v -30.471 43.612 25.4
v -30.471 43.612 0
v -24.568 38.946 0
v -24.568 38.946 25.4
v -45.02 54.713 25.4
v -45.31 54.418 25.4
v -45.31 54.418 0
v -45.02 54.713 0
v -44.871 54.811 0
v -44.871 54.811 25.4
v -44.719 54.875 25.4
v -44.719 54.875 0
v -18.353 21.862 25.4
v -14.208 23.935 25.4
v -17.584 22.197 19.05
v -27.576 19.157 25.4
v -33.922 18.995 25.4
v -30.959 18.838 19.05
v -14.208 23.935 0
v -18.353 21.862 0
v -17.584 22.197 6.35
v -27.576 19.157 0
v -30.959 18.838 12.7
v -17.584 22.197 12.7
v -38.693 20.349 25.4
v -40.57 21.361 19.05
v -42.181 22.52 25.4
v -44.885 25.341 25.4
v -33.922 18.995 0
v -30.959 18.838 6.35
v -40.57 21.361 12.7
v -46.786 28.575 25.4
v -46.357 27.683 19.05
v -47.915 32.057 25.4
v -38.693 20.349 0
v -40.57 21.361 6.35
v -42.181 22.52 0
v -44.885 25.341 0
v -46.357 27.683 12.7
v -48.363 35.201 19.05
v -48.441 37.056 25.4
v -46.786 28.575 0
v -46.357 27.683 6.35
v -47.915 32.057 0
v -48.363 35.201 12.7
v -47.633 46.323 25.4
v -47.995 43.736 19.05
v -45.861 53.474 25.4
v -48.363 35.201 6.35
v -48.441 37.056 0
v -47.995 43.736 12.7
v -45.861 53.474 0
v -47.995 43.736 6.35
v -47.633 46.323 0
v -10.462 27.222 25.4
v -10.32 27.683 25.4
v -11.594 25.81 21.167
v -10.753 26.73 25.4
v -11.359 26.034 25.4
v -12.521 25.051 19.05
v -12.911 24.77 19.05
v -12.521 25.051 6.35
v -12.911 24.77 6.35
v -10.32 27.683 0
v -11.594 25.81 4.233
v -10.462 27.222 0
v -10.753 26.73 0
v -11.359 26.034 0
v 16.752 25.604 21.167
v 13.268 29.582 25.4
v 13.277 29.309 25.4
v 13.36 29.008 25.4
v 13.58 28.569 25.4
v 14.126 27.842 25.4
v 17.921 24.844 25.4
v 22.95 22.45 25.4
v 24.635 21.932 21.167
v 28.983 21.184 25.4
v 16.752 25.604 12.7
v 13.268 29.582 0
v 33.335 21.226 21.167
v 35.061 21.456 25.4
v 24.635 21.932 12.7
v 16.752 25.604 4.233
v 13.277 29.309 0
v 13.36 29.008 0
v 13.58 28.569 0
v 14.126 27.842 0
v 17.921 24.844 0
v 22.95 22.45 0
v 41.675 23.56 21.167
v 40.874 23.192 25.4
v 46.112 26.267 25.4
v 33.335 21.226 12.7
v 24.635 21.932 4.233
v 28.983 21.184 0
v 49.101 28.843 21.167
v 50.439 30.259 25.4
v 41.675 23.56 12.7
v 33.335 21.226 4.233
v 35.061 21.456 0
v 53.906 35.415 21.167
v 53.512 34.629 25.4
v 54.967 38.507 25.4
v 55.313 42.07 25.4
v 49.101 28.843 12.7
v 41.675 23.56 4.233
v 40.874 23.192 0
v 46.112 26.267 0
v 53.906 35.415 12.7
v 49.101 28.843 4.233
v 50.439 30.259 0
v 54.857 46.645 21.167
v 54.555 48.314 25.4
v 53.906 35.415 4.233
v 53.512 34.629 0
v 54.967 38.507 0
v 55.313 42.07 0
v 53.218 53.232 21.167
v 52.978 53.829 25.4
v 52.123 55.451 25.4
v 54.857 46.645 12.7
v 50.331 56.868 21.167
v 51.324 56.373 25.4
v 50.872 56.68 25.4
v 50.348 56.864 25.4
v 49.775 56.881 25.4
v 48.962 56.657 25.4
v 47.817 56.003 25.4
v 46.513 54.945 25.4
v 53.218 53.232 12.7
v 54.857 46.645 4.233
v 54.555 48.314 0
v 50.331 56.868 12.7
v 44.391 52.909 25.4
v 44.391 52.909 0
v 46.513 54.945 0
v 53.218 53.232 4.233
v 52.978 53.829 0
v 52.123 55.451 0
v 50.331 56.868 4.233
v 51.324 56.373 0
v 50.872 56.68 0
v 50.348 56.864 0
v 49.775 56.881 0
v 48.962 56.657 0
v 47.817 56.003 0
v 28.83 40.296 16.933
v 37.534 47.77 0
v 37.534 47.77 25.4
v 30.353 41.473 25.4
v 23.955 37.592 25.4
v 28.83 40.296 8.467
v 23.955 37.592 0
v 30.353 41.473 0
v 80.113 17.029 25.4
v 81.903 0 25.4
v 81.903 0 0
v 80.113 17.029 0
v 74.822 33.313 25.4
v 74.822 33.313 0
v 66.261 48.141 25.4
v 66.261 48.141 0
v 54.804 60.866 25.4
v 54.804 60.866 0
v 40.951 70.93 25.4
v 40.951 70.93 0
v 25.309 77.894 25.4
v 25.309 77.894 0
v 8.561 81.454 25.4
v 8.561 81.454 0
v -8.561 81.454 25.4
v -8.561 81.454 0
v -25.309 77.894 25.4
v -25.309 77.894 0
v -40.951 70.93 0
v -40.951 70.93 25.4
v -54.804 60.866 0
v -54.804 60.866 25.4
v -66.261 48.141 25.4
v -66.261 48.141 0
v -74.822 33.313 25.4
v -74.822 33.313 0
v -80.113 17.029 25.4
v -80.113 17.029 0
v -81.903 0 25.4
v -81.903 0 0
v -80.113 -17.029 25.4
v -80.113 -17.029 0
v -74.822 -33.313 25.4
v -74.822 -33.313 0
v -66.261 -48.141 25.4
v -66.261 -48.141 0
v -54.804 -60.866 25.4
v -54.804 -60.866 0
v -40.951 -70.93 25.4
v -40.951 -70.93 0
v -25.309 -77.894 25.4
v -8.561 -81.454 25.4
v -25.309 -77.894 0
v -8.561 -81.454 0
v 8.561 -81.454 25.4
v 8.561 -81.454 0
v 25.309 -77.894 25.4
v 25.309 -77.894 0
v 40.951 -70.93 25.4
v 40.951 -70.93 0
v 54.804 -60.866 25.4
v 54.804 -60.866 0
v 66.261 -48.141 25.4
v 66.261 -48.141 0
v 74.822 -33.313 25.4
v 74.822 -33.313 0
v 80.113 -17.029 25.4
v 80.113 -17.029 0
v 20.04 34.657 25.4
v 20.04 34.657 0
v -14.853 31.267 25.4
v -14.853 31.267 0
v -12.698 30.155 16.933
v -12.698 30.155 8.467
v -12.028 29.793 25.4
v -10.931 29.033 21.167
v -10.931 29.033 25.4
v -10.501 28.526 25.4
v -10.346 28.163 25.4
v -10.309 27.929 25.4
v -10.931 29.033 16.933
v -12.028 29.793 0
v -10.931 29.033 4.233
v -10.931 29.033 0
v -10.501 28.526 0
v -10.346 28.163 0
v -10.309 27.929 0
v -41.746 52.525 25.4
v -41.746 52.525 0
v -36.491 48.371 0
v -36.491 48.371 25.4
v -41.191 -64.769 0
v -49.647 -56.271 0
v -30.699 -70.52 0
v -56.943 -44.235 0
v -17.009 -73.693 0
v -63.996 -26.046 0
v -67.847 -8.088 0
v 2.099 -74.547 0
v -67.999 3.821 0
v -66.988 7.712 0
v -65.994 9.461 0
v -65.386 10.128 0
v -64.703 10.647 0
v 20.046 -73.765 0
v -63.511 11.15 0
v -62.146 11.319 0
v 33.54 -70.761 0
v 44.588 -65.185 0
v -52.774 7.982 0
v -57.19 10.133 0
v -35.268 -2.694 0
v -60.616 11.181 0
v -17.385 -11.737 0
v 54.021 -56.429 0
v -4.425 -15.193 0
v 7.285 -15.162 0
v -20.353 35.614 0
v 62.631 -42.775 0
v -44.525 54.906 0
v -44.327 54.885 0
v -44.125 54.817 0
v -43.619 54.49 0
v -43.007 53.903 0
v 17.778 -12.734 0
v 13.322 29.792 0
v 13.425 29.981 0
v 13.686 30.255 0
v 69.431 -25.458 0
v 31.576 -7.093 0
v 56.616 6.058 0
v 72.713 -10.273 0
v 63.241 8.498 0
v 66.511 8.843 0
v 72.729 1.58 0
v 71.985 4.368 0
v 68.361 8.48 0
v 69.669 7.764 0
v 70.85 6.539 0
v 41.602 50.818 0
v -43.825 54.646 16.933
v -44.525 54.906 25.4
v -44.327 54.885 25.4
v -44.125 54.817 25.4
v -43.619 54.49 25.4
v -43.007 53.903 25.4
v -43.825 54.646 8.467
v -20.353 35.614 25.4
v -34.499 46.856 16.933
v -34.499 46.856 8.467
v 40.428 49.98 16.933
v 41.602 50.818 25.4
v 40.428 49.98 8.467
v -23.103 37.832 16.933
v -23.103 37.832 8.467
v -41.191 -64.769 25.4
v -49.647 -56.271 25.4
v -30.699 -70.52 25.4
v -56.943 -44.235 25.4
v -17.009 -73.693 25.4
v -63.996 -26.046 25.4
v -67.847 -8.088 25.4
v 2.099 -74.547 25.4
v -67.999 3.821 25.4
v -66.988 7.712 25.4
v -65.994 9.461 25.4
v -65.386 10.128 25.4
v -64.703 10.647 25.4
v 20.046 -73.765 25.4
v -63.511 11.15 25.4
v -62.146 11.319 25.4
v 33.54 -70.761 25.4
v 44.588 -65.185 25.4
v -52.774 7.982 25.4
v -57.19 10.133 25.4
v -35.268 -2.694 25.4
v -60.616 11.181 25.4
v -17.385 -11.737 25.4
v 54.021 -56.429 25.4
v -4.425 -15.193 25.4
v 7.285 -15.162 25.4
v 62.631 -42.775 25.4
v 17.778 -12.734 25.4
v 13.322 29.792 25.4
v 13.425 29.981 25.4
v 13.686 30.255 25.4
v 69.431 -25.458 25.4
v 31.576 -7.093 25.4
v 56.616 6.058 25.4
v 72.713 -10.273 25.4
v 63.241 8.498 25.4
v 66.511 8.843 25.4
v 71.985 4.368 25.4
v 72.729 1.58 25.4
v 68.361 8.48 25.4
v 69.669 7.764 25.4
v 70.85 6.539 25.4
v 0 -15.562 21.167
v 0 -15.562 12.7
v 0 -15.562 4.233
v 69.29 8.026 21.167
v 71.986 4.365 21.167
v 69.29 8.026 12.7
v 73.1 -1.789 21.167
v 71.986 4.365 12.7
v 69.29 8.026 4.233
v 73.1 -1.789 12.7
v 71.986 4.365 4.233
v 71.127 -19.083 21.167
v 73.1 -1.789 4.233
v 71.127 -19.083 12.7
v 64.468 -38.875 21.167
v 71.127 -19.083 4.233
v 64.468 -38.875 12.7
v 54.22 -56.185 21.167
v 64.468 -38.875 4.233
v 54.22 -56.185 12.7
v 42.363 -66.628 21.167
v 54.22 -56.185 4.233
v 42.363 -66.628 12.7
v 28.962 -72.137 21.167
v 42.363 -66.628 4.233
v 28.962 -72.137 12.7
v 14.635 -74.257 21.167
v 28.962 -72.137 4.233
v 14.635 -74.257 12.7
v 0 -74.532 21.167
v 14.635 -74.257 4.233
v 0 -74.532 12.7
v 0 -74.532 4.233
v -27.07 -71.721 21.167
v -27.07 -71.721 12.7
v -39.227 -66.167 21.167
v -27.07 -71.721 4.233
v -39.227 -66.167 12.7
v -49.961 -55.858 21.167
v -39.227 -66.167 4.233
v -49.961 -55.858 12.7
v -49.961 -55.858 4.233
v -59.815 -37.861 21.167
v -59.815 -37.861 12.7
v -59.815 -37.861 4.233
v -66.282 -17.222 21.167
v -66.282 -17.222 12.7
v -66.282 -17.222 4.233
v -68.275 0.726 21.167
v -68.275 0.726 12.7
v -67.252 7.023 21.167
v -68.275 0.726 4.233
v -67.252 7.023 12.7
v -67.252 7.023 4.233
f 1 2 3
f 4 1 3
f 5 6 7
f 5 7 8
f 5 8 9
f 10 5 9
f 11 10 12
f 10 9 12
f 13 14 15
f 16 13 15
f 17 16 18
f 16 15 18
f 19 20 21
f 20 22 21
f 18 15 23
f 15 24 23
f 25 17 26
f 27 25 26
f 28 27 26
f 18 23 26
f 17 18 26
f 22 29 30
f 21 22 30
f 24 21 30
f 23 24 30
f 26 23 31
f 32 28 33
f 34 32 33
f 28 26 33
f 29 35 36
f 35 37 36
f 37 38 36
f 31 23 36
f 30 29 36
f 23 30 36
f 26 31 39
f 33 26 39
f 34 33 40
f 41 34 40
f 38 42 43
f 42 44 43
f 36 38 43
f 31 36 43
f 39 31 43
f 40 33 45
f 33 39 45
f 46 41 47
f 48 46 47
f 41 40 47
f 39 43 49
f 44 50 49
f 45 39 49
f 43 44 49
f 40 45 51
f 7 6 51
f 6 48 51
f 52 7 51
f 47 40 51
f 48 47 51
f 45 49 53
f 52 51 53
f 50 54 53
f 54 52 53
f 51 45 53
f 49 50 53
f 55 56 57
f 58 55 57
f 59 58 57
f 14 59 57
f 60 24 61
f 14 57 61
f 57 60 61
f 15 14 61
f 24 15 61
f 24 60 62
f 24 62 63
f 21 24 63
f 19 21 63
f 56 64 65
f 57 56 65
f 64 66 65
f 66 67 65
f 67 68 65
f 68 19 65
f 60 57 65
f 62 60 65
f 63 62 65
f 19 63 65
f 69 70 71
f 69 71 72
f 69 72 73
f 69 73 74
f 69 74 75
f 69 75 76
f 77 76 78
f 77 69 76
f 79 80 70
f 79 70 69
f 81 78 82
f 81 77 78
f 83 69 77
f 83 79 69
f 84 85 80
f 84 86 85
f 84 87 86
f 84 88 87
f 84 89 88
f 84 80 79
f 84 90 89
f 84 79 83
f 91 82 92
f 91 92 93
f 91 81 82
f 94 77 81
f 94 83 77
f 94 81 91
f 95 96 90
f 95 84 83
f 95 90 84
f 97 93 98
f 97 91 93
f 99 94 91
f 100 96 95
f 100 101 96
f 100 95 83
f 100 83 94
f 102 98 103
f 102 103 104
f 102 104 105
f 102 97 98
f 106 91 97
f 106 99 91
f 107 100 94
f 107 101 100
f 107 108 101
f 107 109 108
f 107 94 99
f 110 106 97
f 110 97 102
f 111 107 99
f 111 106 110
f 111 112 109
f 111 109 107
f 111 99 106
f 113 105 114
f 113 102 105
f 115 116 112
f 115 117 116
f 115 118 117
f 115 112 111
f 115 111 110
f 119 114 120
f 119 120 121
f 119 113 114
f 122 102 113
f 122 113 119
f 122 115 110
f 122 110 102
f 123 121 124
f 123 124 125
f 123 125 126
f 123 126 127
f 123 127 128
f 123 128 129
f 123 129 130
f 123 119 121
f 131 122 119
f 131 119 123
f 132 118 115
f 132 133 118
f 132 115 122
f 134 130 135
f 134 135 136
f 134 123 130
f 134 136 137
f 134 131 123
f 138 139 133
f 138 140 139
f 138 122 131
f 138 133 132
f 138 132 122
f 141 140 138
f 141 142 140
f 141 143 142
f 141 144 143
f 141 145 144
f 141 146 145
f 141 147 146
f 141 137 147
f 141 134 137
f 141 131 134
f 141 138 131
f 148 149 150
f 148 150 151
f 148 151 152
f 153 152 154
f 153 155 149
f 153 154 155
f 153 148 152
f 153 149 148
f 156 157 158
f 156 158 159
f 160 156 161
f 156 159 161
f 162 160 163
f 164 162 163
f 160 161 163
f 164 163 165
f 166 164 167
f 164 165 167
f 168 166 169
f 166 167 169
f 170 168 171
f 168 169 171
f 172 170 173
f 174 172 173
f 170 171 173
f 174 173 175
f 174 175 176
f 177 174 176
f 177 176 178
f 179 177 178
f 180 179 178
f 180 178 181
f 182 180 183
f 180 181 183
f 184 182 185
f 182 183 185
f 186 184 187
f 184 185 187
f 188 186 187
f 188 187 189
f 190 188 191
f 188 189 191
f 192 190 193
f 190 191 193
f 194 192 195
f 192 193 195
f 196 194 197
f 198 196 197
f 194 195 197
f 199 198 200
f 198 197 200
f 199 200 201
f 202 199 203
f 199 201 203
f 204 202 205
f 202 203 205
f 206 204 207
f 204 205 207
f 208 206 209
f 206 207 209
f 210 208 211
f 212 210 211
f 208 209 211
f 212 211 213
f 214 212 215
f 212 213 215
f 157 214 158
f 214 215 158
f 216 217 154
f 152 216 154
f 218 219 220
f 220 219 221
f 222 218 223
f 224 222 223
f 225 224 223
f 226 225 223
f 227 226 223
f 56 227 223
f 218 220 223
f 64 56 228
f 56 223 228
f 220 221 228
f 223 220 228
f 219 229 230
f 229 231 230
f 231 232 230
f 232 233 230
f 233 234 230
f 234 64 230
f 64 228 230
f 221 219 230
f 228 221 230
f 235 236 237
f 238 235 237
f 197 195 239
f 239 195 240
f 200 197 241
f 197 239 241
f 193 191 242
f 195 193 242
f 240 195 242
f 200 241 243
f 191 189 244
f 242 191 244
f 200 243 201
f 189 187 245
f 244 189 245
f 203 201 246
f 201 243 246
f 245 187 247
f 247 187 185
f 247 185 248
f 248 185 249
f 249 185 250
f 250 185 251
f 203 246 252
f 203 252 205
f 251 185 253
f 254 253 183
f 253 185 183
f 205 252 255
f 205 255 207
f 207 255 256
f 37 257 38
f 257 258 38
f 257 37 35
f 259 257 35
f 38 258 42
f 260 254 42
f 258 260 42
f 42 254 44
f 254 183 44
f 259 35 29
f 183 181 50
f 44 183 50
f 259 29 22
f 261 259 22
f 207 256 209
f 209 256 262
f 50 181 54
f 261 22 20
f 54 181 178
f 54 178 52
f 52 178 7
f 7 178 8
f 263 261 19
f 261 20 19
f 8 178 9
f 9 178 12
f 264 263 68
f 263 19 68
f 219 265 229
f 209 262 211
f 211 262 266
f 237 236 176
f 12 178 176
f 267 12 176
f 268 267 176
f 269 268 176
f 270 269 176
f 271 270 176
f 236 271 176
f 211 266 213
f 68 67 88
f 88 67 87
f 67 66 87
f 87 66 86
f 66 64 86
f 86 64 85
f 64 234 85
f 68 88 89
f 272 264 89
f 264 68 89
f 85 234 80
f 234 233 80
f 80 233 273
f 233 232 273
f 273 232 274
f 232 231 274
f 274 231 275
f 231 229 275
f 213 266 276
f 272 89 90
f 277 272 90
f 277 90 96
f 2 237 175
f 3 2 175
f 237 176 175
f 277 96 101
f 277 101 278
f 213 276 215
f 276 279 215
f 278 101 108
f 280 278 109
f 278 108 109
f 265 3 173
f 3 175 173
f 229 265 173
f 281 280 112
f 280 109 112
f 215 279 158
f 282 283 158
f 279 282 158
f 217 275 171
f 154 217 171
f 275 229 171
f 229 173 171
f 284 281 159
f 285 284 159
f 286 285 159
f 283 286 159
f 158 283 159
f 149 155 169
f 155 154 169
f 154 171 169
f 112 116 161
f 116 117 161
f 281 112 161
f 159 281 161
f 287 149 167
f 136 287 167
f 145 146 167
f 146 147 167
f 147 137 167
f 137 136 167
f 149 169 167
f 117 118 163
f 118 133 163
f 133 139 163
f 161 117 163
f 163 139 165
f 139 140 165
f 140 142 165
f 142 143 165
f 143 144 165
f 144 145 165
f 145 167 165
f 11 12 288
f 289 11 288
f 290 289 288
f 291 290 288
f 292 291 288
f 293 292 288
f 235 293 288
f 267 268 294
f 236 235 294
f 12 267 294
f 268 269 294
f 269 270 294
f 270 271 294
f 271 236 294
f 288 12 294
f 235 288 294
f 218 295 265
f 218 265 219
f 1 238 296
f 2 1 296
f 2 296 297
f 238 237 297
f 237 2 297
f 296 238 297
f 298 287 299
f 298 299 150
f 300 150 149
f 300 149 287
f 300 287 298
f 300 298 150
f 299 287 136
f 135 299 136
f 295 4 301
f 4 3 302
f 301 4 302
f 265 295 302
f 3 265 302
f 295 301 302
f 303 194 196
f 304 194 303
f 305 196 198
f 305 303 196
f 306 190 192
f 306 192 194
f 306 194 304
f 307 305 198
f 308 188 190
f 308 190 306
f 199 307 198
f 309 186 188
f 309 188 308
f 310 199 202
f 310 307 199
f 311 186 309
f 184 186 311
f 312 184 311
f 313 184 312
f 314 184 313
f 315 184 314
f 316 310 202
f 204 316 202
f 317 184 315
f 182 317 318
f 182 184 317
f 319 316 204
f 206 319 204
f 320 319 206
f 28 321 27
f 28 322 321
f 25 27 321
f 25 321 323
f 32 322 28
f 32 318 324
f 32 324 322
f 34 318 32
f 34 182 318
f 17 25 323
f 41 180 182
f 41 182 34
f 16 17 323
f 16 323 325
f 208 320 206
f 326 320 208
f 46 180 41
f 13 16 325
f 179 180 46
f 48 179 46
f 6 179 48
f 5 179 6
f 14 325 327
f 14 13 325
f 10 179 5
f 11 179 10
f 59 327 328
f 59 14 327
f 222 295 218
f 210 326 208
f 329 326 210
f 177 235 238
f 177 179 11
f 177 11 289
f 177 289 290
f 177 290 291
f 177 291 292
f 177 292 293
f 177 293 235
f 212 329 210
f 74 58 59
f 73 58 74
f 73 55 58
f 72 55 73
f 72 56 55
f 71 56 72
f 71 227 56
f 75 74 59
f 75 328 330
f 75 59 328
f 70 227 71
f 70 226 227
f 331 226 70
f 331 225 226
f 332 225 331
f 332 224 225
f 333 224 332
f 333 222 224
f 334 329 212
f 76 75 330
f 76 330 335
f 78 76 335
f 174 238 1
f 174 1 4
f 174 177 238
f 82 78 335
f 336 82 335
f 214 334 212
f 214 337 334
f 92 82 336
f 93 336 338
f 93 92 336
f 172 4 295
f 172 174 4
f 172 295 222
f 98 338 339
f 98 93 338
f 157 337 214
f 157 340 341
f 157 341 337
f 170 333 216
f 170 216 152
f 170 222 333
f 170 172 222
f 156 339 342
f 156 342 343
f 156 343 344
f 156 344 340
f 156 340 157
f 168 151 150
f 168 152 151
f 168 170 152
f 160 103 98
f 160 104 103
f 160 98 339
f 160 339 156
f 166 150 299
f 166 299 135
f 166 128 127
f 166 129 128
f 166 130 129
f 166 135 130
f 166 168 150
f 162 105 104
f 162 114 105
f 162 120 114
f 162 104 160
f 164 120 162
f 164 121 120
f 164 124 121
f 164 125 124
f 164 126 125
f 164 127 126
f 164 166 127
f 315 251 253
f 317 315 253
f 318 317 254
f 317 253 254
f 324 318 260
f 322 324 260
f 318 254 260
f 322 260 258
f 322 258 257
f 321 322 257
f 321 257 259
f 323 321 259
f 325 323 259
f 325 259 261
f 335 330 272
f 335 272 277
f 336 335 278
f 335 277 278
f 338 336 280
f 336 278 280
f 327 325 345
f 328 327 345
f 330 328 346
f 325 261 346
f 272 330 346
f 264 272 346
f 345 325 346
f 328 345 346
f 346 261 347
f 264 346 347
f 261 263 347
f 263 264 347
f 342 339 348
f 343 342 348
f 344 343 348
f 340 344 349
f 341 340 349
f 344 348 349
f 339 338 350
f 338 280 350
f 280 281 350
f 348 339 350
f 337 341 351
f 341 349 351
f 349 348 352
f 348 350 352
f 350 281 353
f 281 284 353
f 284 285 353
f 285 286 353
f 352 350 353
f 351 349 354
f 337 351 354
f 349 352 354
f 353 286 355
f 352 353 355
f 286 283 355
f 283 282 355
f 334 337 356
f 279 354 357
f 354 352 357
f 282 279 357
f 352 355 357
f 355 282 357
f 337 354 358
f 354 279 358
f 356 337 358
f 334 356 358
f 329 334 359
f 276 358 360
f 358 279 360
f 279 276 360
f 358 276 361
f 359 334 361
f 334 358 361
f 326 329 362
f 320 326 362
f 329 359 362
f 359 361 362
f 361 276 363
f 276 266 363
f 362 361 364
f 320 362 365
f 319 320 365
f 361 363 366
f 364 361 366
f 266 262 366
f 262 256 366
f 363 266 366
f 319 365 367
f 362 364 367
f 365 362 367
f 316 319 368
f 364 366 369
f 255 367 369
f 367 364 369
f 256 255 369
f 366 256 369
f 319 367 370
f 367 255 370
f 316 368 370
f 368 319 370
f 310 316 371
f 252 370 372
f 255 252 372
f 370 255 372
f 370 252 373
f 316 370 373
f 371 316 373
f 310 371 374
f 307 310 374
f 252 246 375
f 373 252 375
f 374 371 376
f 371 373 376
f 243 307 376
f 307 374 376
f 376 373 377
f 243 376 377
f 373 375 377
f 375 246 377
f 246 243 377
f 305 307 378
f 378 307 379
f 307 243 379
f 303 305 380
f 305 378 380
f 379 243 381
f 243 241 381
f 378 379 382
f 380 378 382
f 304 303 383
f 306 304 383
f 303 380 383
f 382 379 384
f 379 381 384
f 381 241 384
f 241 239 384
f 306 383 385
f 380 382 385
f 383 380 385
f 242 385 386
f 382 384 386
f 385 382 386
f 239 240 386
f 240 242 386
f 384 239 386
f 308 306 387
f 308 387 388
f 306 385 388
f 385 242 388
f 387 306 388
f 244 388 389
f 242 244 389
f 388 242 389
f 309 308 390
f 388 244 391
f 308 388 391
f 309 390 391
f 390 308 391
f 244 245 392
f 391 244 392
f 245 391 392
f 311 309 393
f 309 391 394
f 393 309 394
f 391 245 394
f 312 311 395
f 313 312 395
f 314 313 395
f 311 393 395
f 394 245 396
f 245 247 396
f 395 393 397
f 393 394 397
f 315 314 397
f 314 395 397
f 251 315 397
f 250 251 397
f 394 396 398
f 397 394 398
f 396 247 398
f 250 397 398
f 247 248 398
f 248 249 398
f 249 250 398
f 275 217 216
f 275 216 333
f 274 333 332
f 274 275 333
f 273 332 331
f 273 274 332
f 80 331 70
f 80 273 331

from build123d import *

# Parameters (mm, degrees)
F0_R     = 81.902918293
F1_DEPTH = 25.4


with BuildPart() as f1:
    # F0 (on Top) → F1 (new body)
    with BuildSketch(Plane.XY):
        Circle(F0_R)
        with BuildLine():
            add(Edge.make_bspline(
                [(-64.7033080459, 10.6473797932), (-55.638691326, 16.2235461657), (-0.5013684948, -46.3821262938), (88.1133259334, 43.339149836), (61.4765252175, -73.4087770429), (-0.1257711411, -75.3164533915), (-57.1020292766, -72.3904873582), (-73.6575101256, 5.1391358077), (-64.7033080459, 10.6473797932)],
                knots=[0, 0, 0, 0, 0.1735094926, 0.3511757019, 0.519828612, 0.6769418156, 0.8286039986, 1, 1, 1, 1], degree=3))
        make_face(mode=Mode.SUBTRACT)
        with BuildLine():
            add(Edge.make_bspline(
                [(-10.3197693825, 27.6831854135), (-10.7546762642, 24.6549609474), (-32.7110043658, 14.0295047318), (-48.8070708673, 26.7191397879), (-48.7153193022, 42.2672541357), (-46.2129546559, 54.4217754372), (-44.7189956903, 54.8749603331)],
                knots=[0, 0, 0, 0, 0.1402195568, 0.264912908, 0.383777657, 0.484604884, 0.484604884, 0.484604884, 0.484604884], degree=3))
            add(Edge.make_bspline(
                [(-44.7189956903, 54.8749603331), (-43.8655444042, 55.1338504641), (-42.8993390105, 53.7201742756), (-41.7464575259, 52.525239209)],
                knots=[0.484604884, 0.484604884, 0.484604884, 0.484604884, 0.542204275, 0.542204275, 0.542204275, 0.542204275], degree=3))
            Line((-41.7464575259, 52.525239209), (-36.4907558108, 48.3707312906))
            add(Edge.make_bspline(
                [(-36.4907558108, 48.3707312906), (-34.5004466095, 46.9114950565), (-32.5139801247, 45.2674795506), (-30.4707956879, 43.6120951742)],
                knots=[0.6187938265, 0.6187938265, 0.6187938265, 0.6187938265, 0.7007630798, 0.7007630798, 0.7007630798, 0.7007630798], degree=3))
            Line((-30.4707956879, 43.6120951742), (-24.5679702911, 38.9460512887))
            add(Edge.make_bspline(
                [(-24.5679702911, 38.9460512887), (-23.0462694735, 37.7828890396), (-21.7230970705, 36.8152719658), (-20.3530360137, 35.6142454177)],
                knots=[0.7819309481, 0.7819309481, 0.7819309481, 0.7819309481, 0.850519175, 0.850519175, 0.850519175, 0.850519175], degree=3))
            Line((-20.3530360137, 35.6142454177), (-14.8534622354, 31.2669624005))
            add(Edge.make_bspline(
                [(-14.8534622354, 31.2669624005), (-12.7575228708, 30.0875918291), (-10.0991376837, 29.2194276214), (-10.3197693825, 27.6831854135)],
                knots=[0.9288655105, 0.9288655105, 0.9288655105, 0.9288655105, 1, 1, 1, 1], degree=3))
        make_face(mode=Mode.SUBTRACT)
        with BuildLine():
            add(Edge.make_bspline(
                [(20.0402461774, 34.6573553744), (19.0855216744, 33.9199072149), (17.4015863072, 32.7935603855), (15.6728127348, 31.0543564349), (13.3584732412, 30.3603178638), (13.2682733238, 29.5815523714)],
                knots=[0.869222989, 0.869222989, 0.869222989, 0.869222989, 0.9159771846, 0.9577752247, 1, 1, 1, 1], degree=3))
            add(Edge.make_bspline(
                [(23.9551238818, 37.5916772387), (22.4871119125, 36.6865231729), (21.214072016, 35.5640417552), (20.0402461774, 34.6573553744)],
                knots=[0.8117390943, 0.8117390943, 0.8117390943, 0.8117390943, 0.869222989, 0.869222989, 0.869222989, 0.869222989], degree=3))
            add(Edge.make_bspline(
                [(37.5341082285, 47.7695457881), (36.2480528135, 46.7505662168), (32.5629459388, 43.6976408534), (29.262387548, 40.0600353259), (25.5221471778, 38.5578801969), (23.9551238818, 37.5916772387)],
                knots=[0.6461857755, 0.6461857755, 0.6461857755, 0.6461857755, 0.6834655967, 0.750378149, 0.8117390943, 0.8117390943, 0.8117390943, 0.8117390943], degree=3))
            add(Edge.make_bspline(
                [(41.6016501152, 50.8182941765), (40.5640970851, 50.102162609), (39.0723272323, 48.9883219955), (37.5341082285, 47.7695457881)],
                knots=[0.6015963056, 0.6015963056, 0.6015963056, 0.6015963056, 0.6461857755, 0.6461857755, 0.6461857755, 0.6461857755], degree=3))
            Line((41.6016501152, 50.8182941765), (44.3913824856, 52.9092848301))
            add(Edge.make_bspline(
                [(13.2682733238, 29.5815523714), (13.0796071411, 27.9526516269), (23.3956142868, 19.9149627224), (42.3360455892, 21.1472231964), (55.603881243, 34.9274274397), (55.5617796072, 45.6068310596), (51.5625129671, 60.7711012443), (45.9215093945, 54.3448631124), (44.3913824856, 52.9092848301)],
                knots=[0, 0, 0, 0, 0.0883192291, 0.202241682, 0.3095000963, 0.3969770332, 0.4836397483, 0.5530709914, 0.5530709914, 0.5530709914, 0.5530709914], degree=3))
        make_face(mode=Mode.SUBTRACT)
        with BuildLine():
            add(Edge.make_bspline(
                [(23.9551238818, 37.5916772387), (22.4871119125, 36.6865231729), (21.214072016, 35.5640417552), (20.0402461774, 34.6573553744)],
                knots=[0.8117390943, 0.8117390943, 0.8117390943, 0.8117390943, 0.869222989, 0.869222989, 0.869222989, 0.869222989], degree=3))
            Line((20.0402461774, 34.6573553744), (23.9551238818, 37.5916772387))
        make_face()
    extrude(amount=F1_DEPTH)


solid = f1.part
